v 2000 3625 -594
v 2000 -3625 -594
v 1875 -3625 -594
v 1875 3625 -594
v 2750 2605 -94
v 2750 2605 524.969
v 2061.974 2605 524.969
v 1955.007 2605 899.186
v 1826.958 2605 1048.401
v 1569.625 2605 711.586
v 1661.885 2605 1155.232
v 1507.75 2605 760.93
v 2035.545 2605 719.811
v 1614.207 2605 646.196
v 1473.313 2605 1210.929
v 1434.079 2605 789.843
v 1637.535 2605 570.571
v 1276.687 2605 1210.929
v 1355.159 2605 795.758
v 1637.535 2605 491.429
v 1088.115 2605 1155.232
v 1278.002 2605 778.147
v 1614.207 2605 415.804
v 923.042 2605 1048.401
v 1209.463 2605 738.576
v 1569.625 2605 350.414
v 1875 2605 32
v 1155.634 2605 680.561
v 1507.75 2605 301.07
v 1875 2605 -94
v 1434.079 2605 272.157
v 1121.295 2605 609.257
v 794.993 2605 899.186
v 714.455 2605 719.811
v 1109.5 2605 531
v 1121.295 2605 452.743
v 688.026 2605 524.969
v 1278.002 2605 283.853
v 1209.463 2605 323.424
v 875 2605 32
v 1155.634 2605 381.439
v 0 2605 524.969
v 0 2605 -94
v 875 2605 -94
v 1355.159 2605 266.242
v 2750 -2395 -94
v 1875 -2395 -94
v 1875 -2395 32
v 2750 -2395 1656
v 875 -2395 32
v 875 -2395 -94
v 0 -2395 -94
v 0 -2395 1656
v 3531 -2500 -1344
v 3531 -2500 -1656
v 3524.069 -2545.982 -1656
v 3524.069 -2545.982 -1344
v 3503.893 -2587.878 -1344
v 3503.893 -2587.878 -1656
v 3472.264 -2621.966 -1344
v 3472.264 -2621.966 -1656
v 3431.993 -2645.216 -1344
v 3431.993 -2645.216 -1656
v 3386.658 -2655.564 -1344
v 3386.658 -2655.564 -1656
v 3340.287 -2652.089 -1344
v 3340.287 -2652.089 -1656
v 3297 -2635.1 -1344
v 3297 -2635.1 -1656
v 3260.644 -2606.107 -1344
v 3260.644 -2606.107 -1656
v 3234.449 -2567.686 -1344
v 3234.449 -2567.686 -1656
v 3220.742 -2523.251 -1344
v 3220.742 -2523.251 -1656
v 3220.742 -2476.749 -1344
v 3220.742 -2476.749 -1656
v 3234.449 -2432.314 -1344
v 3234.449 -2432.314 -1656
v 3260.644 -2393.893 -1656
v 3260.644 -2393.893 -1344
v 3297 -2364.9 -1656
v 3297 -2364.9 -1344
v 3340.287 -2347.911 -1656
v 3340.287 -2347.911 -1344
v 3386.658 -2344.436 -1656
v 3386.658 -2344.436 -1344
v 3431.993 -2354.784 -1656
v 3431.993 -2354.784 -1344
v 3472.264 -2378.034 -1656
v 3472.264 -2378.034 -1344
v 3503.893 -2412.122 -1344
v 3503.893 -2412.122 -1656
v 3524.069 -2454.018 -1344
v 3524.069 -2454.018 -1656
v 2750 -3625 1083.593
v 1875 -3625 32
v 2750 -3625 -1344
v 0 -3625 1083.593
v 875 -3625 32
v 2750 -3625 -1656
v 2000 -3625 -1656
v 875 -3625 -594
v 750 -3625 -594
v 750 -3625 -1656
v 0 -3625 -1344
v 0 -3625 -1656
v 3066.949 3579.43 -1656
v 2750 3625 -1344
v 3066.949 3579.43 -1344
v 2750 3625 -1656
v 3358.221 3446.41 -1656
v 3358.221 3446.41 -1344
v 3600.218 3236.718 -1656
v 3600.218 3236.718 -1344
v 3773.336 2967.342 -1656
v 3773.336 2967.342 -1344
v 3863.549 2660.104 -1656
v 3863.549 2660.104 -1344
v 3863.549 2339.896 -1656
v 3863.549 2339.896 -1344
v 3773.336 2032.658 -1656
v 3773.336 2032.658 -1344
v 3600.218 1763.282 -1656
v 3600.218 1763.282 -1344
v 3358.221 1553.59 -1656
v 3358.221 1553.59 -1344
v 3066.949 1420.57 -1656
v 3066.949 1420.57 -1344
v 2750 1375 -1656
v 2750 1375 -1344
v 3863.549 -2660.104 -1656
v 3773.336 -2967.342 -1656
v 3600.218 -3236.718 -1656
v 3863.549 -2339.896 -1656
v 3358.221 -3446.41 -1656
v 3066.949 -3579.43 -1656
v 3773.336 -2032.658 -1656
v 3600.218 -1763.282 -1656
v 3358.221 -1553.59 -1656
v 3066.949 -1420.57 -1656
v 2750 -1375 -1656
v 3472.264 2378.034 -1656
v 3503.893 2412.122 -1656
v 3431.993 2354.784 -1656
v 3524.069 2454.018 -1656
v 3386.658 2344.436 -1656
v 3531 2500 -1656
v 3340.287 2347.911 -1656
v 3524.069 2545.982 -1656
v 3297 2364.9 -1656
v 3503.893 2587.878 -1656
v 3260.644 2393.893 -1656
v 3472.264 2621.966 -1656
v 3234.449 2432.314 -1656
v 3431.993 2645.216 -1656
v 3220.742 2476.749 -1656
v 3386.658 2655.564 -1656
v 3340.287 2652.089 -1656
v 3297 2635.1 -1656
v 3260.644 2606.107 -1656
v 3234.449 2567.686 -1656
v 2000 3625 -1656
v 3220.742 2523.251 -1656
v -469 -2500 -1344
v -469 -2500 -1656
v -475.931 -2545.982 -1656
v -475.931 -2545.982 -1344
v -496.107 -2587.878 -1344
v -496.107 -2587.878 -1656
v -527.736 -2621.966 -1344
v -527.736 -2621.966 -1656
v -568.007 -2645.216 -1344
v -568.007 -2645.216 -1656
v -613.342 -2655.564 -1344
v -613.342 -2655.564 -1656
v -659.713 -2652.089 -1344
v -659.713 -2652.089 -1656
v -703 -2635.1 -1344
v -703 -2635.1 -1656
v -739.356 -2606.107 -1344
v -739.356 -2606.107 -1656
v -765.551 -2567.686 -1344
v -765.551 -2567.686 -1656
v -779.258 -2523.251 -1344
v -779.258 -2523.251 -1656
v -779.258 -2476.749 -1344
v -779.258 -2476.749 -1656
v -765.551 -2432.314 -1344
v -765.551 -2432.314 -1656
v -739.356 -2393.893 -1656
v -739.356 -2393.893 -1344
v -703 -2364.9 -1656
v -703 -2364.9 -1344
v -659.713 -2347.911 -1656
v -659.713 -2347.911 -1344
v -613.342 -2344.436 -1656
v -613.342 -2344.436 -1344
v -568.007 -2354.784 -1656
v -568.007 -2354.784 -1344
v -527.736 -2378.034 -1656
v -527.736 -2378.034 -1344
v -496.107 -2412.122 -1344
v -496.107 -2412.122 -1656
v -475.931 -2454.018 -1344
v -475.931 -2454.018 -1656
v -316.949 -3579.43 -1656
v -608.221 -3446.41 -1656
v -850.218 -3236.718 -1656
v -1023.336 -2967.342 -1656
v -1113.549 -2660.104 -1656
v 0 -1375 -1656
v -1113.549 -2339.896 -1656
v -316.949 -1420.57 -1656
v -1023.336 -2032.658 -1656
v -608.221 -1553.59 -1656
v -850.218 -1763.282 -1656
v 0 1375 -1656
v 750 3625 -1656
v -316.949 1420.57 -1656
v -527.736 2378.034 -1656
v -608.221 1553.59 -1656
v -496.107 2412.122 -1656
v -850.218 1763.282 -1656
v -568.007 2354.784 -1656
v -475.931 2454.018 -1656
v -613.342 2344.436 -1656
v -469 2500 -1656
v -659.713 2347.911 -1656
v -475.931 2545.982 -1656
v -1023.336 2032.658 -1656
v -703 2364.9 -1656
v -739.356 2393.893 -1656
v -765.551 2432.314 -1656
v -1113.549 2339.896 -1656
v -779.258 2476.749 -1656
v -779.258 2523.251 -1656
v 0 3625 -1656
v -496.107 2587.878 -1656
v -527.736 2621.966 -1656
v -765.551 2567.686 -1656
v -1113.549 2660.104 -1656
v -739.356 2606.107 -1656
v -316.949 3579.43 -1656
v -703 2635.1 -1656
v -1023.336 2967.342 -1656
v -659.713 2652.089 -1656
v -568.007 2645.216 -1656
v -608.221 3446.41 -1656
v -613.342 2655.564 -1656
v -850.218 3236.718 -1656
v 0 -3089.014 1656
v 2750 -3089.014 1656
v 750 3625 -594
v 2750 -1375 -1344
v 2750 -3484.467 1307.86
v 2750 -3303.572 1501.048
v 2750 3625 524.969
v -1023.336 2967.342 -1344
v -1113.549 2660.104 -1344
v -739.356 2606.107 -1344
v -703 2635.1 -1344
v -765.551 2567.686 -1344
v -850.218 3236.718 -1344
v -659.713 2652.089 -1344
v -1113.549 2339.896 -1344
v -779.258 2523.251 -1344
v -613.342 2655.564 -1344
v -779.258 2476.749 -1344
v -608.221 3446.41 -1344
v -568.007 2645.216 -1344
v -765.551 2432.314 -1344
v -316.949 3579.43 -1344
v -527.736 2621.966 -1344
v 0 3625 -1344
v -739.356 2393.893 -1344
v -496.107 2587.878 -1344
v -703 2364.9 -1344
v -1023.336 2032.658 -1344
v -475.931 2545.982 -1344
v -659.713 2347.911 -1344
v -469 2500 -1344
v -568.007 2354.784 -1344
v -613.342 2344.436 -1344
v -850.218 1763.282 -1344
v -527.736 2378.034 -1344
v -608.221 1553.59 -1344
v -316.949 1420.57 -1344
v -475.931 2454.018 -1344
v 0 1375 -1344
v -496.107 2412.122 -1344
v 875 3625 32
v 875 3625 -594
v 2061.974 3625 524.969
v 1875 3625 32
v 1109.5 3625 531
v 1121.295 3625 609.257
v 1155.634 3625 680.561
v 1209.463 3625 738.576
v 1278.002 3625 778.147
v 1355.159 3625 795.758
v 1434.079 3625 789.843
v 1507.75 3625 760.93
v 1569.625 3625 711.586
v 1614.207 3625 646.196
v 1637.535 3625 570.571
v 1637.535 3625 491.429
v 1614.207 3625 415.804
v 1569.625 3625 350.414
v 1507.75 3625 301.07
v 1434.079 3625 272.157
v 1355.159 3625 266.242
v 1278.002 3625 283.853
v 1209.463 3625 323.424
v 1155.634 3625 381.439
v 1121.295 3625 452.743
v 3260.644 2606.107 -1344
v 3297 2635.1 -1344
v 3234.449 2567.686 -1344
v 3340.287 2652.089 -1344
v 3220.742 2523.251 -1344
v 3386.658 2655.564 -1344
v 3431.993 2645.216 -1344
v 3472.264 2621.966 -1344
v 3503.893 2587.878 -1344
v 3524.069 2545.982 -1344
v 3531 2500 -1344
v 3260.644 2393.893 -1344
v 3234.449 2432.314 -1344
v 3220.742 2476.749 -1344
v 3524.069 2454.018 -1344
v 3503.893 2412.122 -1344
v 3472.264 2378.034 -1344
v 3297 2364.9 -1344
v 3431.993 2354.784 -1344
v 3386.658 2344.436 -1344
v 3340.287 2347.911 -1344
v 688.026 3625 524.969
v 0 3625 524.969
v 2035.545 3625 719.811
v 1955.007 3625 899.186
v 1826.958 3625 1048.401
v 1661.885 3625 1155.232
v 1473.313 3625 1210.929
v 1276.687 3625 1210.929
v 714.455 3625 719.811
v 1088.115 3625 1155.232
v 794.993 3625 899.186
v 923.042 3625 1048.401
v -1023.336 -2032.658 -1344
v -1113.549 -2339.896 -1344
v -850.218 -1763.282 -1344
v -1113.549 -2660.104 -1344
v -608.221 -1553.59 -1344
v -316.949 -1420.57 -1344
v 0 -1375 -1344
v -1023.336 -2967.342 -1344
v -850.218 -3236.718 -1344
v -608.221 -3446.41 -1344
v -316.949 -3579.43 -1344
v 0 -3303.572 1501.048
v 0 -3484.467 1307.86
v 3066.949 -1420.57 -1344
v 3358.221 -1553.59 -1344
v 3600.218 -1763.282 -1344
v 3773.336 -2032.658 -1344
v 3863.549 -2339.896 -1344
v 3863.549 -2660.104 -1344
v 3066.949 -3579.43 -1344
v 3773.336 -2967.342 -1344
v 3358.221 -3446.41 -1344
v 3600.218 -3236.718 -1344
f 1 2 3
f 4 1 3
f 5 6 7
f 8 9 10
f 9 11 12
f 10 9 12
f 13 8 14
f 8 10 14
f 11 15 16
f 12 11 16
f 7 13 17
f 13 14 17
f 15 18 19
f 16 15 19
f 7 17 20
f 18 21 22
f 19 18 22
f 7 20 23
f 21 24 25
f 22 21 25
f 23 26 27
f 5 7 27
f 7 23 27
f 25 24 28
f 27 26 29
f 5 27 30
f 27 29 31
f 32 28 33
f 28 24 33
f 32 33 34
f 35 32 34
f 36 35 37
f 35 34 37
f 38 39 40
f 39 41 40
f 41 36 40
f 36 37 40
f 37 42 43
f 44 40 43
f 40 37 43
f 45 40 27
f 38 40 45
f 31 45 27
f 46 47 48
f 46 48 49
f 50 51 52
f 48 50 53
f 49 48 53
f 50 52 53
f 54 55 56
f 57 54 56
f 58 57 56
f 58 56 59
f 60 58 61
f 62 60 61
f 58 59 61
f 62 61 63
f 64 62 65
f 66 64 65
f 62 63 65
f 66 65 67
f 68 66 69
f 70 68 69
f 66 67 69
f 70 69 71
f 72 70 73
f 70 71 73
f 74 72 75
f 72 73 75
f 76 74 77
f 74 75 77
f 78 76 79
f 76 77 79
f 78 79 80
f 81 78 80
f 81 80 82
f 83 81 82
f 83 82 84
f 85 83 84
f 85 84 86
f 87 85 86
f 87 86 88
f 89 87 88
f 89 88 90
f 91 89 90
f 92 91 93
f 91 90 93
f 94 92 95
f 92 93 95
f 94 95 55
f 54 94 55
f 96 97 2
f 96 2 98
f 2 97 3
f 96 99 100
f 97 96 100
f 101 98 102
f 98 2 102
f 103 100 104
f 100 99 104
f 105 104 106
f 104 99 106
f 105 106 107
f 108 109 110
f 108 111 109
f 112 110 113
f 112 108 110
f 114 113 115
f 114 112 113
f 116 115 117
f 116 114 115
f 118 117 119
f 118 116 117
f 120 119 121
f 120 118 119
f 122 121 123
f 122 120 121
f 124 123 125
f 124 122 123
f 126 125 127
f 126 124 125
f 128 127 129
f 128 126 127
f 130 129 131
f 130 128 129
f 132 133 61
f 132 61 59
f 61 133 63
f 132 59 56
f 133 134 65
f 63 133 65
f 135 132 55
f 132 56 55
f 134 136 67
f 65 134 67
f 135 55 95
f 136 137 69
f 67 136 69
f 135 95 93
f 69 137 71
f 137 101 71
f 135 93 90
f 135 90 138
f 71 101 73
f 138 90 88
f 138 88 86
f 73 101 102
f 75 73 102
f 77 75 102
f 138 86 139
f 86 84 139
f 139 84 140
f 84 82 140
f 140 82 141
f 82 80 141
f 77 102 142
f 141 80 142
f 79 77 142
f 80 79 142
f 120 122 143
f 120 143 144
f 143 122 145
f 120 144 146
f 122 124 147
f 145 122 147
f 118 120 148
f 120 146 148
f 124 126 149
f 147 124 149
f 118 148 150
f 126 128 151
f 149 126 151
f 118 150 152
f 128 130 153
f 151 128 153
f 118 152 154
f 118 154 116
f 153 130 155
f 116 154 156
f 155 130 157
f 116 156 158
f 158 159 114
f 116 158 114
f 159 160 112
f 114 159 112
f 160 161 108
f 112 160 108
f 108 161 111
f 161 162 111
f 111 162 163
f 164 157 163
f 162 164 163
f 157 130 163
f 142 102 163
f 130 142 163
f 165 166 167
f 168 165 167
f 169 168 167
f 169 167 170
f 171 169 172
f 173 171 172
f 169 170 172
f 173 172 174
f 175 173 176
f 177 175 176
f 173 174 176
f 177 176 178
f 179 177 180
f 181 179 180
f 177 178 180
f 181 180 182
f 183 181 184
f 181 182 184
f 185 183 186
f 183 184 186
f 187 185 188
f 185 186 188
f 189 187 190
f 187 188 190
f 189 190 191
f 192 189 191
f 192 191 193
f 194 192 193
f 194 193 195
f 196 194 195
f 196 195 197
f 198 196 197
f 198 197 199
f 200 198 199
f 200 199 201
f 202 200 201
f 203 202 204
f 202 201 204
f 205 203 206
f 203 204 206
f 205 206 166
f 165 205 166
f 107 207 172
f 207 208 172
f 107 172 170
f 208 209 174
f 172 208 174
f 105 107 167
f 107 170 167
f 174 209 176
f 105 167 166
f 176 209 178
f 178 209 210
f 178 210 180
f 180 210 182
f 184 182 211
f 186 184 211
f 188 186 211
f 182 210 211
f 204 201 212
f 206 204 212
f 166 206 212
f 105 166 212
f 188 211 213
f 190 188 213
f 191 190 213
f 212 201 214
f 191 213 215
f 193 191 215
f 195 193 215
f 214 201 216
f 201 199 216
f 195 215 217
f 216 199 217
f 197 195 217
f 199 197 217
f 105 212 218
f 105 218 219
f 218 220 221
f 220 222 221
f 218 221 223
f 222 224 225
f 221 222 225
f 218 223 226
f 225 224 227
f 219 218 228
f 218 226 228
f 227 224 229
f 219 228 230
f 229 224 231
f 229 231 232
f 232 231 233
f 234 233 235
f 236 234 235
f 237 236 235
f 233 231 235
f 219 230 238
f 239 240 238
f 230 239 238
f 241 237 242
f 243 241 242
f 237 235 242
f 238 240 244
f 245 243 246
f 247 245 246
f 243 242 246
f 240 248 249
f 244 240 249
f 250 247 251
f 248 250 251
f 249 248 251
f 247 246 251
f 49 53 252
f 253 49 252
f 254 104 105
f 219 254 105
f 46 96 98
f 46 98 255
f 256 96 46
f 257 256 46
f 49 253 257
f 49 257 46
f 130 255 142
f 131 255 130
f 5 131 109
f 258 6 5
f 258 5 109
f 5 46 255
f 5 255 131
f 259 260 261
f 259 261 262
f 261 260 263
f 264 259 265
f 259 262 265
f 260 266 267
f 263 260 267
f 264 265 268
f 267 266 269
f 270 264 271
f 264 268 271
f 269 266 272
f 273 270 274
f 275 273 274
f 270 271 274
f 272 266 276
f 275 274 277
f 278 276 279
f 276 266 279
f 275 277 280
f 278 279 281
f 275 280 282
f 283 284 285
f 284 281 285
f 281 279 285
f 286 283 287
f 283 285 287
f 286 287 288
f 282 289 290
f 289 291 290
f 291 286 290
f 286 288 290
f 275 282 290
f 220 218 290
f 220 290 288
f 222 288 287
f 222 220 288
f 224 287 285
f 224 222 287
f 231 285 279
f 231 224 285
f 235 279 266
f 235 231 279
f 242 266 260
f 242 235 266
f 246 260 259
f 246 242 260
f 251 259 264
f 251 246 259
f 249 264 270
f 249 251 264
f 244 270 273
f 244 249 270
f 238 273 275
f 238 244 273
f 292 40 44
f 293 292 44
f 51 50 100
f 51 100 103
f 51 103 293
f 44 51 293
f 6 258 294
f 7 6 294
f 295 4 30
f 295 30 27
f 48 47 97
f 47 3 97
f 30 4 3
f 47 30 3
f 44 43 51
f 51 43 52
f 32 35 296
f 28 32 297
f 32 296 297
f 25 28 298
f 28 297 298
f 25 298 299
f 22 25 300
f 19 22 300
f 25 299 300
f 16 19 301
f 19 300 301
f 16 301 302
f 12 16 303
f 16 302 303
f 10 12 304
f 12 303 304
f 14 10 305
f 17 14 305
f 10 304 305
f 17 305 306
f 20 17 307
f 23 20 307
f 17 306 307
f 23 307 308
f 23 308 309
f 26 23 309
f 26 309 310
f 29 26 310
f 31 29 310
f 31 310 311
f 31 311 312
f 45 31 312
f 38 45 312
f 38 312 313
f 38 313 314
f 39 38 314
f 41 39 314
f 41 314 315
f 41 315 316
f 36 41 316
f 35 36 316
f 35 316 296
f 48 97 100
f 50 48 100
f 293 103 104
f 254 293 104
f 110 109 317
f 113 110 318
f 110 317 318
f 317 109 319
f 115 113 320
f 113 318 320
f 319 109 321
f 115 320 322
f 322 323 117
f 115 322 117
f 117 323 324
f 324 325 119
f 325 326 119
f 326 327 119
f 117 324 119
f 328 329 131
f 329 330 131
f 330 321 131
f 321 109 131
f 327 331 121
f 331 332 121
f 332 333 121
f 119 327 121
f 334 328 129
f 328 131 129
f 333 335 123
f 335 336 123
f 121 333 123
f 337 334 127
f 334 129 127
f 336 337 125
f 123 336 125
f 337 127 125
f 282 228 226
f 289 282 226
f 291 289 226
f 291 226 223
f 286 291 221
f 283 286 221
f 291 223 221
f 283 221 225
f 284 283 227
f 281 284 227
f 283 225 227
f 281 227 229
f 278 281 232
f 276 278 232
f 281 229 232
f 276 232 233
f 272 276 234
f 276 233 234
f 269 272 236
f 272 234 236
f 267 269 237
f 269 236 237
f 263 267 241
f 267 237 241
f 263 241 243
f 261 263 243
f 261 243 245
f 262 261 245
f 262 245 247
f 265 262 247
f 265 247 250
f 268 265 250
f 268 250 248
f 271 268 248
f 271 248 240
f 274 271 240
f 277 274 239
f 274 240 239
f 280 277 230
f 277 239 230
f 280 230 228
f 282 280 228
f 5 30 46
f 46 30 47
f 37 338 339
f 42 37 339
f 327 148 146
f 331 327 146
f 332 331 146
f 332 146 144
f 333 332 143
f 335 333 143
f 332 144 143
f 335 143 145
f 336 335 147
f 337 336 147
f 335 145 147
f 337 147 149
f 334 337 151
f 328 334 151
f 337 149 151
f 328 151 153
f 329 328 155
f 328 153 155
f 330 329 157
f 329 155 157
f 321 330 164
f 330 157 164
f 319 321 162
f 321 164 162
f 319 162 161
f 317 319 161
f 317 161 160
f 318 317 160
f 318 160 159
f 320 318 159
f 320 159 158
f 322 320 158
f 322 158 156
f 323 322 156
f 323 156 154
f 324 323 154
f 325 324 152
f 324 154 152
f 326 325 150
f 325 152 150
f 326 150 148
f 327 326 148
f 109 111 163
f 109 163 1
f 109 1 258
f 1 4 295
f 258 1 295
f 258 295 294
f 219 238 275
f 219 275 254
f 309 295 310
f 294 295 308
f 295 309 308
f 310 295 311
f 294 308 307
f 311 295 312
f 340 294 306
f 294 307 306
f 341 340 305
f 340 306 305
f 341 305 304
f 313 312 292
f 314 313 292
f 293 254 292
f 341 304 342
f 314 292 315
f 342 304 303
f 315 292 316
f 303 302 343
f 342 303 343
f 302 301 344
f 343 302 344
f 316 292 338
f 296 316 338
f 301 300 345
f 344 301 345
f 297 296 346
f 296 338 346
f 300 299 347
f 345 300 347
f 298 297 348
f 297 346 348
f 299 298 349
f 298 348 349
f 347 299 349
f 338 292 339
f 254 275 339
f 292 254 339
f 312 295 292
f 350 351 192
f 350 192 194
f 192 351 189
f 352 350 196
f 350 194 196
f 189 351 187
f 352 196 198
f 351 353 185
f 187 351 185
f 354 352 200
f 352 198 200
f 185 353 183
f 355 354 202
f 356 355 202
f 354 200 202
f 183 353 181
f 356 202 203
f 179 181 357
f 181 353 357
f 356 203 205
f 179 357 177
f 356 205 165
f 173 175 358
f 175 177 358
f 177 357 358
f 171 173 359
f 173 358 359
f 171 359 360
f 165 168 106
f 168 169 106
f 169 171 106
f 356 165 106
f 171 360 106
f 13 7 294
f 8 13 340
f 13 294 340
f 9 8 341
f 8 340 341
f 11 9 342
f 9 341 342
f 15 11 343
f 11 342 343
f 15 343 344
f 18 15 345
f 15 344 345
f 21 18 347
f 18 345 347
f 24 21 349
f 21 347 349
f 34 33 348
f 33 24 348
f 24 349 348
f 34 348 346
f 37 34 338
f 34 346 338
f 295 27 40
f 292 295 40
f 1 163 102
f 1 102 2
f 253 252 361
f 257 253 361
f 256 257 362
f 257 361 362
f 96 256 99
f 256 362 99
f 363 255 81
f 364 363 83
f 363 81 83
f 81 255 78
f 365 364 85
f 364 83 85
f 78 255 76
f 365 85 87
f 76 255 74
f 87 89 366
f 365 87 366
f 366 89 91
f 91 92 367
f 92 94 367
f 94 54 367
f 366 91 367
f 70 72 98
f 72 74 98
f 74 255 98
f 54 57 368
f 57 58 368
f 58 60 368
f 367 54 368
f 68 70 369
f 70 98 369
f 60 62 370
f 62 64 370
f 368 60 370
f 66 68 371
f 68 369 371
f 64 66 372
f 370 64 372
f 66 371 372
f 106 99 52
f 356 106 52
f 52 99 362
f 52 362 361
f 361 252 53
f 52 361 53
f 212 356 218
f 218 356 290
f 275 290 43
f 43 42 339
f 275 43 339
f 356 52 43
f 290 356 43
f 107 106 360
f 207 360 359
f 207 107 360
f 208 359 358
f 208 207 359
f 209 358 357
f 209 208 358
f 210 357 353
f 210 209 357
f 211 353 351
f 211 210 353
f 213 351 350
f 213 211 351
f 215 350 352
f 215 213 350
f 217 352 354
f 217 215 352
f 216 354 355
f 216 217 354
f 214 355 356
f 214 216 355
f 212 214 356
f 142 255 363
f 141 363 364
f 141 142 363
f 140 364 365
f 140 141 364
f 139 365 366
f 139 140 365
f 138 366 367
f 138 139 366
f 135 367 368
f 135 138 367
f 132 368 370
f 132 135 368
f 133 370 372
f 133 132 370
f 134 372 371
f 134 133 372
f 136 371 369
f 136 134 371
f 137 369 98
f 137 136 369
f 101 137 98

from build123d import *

# Parameters (mm, degrees)
F1_DEPTH = 2750
F2_R     = 1125
F2_R_2   = 156
F3_DEPTH = 312
F5_DEPTH = 9516.50351
F6_R     = 265.5
F7_DEPTH = 2759.03485


with BuildPart() as f1:
    # F0 (on Right) → F1 (new body)
    with BuildSketch(Plane.YZ):
        with BuildLine():
            Line((-2395, 1656), (-3089.0144090723, 1656))
            ThreePointArc((-3089.0144090723, 1656), (-3398.6783356879, 1408.816364228), (-3625, 1083.5933615001))
            Line((-3625, 1083.5933615001), (-3625, -1656))
            Line((-3625, -1656), (0, -1656))
            Line((0, -1656), (0, -94))
            Line((0, -94), (-2395, -94))
            Line((-2395, -94), (-2395, 1656))
        make_face()
        Polygon((2605, -94), (0, -94), (0, -1656), (3625, -1656), (3625, 1656), (2605, 1656), align=None)
    extrude(amount=F1_DEPTH)

    # F2 (on face) → F3 (join)
    with BuildSketch(Plane(origin=(0, 0, -1656), x_dir=(1, 0, 0), z_dir=(0, 0, -1))):
        with Locations((0, 2500)):
            Circle(F2_R)
        with Locations((-625, 2500)):
            Circle(F2_R_2, mode=Mode.SUBTRACT)
        with Locations((2750, 2500)):
            Circle(F2_R)
        with Locations((3375, 2500)):
            Circle(F2_R_2, mode=Mode.SUBTRACT)
        with Locations((2750, -2500)):
            Circle(F2_R)
        with Locations((3375, -2500)):
            Circle(F2_R_2, mode=Mode.SUBTRACT)
        with Locations((0, -2500)):
            Circle(F2_R)
        with Locations((-625, -2500)):
            Circle(F2_R_2, mode=Mode.SUBTRACT)
    extrude(amount=-F3_DEPTH)

    # F4 (on face) → F5 (cut)
    with BuildSketch(Plane.XZ.offset(3625)):
        Polygon((1375, 32), (875, 32), (875, -594), (750, -594), (750, -1656), (875, -1656), (1875, -1656), (2000, -1656), (2000, -594), (1875, -594), (1875, 32), align=None)
    extrude(amount=-F5_DEPTH, mode=Mode.SUBTRACT)

    # F6 (on face) → F7 (cut)
    with BuildSketch(Plane(origin=(0, 3625, 0), x_dir=(-1, 0, 0), z_dir=(0, 1, 0))):
        with Locations((-1375, 531)):
            Circle(F6_R)
        with BuildLine():
            ThreePointArc((-2061.9735275378, 524.9690413475), (-1375, 1218), (-688.0264724622, 524.9690413475))
            Line((-688.0264724622, 524.9690413475), (0, 524.9690413475))
            Line((0, 524.9690413475), (0, 1656))
            Line((0, 1656), (-2750, 1656))
            Line((-2750, 1656), (-2750, 524.9690413475))
            Line((-2750, 524.9690413475), (-2061.9735275378, 524.9690413475))
        make_face()
    extrude(amount=-F7_DEPTH, mode=Mode.SUBTRACT)


solid = f1.part
